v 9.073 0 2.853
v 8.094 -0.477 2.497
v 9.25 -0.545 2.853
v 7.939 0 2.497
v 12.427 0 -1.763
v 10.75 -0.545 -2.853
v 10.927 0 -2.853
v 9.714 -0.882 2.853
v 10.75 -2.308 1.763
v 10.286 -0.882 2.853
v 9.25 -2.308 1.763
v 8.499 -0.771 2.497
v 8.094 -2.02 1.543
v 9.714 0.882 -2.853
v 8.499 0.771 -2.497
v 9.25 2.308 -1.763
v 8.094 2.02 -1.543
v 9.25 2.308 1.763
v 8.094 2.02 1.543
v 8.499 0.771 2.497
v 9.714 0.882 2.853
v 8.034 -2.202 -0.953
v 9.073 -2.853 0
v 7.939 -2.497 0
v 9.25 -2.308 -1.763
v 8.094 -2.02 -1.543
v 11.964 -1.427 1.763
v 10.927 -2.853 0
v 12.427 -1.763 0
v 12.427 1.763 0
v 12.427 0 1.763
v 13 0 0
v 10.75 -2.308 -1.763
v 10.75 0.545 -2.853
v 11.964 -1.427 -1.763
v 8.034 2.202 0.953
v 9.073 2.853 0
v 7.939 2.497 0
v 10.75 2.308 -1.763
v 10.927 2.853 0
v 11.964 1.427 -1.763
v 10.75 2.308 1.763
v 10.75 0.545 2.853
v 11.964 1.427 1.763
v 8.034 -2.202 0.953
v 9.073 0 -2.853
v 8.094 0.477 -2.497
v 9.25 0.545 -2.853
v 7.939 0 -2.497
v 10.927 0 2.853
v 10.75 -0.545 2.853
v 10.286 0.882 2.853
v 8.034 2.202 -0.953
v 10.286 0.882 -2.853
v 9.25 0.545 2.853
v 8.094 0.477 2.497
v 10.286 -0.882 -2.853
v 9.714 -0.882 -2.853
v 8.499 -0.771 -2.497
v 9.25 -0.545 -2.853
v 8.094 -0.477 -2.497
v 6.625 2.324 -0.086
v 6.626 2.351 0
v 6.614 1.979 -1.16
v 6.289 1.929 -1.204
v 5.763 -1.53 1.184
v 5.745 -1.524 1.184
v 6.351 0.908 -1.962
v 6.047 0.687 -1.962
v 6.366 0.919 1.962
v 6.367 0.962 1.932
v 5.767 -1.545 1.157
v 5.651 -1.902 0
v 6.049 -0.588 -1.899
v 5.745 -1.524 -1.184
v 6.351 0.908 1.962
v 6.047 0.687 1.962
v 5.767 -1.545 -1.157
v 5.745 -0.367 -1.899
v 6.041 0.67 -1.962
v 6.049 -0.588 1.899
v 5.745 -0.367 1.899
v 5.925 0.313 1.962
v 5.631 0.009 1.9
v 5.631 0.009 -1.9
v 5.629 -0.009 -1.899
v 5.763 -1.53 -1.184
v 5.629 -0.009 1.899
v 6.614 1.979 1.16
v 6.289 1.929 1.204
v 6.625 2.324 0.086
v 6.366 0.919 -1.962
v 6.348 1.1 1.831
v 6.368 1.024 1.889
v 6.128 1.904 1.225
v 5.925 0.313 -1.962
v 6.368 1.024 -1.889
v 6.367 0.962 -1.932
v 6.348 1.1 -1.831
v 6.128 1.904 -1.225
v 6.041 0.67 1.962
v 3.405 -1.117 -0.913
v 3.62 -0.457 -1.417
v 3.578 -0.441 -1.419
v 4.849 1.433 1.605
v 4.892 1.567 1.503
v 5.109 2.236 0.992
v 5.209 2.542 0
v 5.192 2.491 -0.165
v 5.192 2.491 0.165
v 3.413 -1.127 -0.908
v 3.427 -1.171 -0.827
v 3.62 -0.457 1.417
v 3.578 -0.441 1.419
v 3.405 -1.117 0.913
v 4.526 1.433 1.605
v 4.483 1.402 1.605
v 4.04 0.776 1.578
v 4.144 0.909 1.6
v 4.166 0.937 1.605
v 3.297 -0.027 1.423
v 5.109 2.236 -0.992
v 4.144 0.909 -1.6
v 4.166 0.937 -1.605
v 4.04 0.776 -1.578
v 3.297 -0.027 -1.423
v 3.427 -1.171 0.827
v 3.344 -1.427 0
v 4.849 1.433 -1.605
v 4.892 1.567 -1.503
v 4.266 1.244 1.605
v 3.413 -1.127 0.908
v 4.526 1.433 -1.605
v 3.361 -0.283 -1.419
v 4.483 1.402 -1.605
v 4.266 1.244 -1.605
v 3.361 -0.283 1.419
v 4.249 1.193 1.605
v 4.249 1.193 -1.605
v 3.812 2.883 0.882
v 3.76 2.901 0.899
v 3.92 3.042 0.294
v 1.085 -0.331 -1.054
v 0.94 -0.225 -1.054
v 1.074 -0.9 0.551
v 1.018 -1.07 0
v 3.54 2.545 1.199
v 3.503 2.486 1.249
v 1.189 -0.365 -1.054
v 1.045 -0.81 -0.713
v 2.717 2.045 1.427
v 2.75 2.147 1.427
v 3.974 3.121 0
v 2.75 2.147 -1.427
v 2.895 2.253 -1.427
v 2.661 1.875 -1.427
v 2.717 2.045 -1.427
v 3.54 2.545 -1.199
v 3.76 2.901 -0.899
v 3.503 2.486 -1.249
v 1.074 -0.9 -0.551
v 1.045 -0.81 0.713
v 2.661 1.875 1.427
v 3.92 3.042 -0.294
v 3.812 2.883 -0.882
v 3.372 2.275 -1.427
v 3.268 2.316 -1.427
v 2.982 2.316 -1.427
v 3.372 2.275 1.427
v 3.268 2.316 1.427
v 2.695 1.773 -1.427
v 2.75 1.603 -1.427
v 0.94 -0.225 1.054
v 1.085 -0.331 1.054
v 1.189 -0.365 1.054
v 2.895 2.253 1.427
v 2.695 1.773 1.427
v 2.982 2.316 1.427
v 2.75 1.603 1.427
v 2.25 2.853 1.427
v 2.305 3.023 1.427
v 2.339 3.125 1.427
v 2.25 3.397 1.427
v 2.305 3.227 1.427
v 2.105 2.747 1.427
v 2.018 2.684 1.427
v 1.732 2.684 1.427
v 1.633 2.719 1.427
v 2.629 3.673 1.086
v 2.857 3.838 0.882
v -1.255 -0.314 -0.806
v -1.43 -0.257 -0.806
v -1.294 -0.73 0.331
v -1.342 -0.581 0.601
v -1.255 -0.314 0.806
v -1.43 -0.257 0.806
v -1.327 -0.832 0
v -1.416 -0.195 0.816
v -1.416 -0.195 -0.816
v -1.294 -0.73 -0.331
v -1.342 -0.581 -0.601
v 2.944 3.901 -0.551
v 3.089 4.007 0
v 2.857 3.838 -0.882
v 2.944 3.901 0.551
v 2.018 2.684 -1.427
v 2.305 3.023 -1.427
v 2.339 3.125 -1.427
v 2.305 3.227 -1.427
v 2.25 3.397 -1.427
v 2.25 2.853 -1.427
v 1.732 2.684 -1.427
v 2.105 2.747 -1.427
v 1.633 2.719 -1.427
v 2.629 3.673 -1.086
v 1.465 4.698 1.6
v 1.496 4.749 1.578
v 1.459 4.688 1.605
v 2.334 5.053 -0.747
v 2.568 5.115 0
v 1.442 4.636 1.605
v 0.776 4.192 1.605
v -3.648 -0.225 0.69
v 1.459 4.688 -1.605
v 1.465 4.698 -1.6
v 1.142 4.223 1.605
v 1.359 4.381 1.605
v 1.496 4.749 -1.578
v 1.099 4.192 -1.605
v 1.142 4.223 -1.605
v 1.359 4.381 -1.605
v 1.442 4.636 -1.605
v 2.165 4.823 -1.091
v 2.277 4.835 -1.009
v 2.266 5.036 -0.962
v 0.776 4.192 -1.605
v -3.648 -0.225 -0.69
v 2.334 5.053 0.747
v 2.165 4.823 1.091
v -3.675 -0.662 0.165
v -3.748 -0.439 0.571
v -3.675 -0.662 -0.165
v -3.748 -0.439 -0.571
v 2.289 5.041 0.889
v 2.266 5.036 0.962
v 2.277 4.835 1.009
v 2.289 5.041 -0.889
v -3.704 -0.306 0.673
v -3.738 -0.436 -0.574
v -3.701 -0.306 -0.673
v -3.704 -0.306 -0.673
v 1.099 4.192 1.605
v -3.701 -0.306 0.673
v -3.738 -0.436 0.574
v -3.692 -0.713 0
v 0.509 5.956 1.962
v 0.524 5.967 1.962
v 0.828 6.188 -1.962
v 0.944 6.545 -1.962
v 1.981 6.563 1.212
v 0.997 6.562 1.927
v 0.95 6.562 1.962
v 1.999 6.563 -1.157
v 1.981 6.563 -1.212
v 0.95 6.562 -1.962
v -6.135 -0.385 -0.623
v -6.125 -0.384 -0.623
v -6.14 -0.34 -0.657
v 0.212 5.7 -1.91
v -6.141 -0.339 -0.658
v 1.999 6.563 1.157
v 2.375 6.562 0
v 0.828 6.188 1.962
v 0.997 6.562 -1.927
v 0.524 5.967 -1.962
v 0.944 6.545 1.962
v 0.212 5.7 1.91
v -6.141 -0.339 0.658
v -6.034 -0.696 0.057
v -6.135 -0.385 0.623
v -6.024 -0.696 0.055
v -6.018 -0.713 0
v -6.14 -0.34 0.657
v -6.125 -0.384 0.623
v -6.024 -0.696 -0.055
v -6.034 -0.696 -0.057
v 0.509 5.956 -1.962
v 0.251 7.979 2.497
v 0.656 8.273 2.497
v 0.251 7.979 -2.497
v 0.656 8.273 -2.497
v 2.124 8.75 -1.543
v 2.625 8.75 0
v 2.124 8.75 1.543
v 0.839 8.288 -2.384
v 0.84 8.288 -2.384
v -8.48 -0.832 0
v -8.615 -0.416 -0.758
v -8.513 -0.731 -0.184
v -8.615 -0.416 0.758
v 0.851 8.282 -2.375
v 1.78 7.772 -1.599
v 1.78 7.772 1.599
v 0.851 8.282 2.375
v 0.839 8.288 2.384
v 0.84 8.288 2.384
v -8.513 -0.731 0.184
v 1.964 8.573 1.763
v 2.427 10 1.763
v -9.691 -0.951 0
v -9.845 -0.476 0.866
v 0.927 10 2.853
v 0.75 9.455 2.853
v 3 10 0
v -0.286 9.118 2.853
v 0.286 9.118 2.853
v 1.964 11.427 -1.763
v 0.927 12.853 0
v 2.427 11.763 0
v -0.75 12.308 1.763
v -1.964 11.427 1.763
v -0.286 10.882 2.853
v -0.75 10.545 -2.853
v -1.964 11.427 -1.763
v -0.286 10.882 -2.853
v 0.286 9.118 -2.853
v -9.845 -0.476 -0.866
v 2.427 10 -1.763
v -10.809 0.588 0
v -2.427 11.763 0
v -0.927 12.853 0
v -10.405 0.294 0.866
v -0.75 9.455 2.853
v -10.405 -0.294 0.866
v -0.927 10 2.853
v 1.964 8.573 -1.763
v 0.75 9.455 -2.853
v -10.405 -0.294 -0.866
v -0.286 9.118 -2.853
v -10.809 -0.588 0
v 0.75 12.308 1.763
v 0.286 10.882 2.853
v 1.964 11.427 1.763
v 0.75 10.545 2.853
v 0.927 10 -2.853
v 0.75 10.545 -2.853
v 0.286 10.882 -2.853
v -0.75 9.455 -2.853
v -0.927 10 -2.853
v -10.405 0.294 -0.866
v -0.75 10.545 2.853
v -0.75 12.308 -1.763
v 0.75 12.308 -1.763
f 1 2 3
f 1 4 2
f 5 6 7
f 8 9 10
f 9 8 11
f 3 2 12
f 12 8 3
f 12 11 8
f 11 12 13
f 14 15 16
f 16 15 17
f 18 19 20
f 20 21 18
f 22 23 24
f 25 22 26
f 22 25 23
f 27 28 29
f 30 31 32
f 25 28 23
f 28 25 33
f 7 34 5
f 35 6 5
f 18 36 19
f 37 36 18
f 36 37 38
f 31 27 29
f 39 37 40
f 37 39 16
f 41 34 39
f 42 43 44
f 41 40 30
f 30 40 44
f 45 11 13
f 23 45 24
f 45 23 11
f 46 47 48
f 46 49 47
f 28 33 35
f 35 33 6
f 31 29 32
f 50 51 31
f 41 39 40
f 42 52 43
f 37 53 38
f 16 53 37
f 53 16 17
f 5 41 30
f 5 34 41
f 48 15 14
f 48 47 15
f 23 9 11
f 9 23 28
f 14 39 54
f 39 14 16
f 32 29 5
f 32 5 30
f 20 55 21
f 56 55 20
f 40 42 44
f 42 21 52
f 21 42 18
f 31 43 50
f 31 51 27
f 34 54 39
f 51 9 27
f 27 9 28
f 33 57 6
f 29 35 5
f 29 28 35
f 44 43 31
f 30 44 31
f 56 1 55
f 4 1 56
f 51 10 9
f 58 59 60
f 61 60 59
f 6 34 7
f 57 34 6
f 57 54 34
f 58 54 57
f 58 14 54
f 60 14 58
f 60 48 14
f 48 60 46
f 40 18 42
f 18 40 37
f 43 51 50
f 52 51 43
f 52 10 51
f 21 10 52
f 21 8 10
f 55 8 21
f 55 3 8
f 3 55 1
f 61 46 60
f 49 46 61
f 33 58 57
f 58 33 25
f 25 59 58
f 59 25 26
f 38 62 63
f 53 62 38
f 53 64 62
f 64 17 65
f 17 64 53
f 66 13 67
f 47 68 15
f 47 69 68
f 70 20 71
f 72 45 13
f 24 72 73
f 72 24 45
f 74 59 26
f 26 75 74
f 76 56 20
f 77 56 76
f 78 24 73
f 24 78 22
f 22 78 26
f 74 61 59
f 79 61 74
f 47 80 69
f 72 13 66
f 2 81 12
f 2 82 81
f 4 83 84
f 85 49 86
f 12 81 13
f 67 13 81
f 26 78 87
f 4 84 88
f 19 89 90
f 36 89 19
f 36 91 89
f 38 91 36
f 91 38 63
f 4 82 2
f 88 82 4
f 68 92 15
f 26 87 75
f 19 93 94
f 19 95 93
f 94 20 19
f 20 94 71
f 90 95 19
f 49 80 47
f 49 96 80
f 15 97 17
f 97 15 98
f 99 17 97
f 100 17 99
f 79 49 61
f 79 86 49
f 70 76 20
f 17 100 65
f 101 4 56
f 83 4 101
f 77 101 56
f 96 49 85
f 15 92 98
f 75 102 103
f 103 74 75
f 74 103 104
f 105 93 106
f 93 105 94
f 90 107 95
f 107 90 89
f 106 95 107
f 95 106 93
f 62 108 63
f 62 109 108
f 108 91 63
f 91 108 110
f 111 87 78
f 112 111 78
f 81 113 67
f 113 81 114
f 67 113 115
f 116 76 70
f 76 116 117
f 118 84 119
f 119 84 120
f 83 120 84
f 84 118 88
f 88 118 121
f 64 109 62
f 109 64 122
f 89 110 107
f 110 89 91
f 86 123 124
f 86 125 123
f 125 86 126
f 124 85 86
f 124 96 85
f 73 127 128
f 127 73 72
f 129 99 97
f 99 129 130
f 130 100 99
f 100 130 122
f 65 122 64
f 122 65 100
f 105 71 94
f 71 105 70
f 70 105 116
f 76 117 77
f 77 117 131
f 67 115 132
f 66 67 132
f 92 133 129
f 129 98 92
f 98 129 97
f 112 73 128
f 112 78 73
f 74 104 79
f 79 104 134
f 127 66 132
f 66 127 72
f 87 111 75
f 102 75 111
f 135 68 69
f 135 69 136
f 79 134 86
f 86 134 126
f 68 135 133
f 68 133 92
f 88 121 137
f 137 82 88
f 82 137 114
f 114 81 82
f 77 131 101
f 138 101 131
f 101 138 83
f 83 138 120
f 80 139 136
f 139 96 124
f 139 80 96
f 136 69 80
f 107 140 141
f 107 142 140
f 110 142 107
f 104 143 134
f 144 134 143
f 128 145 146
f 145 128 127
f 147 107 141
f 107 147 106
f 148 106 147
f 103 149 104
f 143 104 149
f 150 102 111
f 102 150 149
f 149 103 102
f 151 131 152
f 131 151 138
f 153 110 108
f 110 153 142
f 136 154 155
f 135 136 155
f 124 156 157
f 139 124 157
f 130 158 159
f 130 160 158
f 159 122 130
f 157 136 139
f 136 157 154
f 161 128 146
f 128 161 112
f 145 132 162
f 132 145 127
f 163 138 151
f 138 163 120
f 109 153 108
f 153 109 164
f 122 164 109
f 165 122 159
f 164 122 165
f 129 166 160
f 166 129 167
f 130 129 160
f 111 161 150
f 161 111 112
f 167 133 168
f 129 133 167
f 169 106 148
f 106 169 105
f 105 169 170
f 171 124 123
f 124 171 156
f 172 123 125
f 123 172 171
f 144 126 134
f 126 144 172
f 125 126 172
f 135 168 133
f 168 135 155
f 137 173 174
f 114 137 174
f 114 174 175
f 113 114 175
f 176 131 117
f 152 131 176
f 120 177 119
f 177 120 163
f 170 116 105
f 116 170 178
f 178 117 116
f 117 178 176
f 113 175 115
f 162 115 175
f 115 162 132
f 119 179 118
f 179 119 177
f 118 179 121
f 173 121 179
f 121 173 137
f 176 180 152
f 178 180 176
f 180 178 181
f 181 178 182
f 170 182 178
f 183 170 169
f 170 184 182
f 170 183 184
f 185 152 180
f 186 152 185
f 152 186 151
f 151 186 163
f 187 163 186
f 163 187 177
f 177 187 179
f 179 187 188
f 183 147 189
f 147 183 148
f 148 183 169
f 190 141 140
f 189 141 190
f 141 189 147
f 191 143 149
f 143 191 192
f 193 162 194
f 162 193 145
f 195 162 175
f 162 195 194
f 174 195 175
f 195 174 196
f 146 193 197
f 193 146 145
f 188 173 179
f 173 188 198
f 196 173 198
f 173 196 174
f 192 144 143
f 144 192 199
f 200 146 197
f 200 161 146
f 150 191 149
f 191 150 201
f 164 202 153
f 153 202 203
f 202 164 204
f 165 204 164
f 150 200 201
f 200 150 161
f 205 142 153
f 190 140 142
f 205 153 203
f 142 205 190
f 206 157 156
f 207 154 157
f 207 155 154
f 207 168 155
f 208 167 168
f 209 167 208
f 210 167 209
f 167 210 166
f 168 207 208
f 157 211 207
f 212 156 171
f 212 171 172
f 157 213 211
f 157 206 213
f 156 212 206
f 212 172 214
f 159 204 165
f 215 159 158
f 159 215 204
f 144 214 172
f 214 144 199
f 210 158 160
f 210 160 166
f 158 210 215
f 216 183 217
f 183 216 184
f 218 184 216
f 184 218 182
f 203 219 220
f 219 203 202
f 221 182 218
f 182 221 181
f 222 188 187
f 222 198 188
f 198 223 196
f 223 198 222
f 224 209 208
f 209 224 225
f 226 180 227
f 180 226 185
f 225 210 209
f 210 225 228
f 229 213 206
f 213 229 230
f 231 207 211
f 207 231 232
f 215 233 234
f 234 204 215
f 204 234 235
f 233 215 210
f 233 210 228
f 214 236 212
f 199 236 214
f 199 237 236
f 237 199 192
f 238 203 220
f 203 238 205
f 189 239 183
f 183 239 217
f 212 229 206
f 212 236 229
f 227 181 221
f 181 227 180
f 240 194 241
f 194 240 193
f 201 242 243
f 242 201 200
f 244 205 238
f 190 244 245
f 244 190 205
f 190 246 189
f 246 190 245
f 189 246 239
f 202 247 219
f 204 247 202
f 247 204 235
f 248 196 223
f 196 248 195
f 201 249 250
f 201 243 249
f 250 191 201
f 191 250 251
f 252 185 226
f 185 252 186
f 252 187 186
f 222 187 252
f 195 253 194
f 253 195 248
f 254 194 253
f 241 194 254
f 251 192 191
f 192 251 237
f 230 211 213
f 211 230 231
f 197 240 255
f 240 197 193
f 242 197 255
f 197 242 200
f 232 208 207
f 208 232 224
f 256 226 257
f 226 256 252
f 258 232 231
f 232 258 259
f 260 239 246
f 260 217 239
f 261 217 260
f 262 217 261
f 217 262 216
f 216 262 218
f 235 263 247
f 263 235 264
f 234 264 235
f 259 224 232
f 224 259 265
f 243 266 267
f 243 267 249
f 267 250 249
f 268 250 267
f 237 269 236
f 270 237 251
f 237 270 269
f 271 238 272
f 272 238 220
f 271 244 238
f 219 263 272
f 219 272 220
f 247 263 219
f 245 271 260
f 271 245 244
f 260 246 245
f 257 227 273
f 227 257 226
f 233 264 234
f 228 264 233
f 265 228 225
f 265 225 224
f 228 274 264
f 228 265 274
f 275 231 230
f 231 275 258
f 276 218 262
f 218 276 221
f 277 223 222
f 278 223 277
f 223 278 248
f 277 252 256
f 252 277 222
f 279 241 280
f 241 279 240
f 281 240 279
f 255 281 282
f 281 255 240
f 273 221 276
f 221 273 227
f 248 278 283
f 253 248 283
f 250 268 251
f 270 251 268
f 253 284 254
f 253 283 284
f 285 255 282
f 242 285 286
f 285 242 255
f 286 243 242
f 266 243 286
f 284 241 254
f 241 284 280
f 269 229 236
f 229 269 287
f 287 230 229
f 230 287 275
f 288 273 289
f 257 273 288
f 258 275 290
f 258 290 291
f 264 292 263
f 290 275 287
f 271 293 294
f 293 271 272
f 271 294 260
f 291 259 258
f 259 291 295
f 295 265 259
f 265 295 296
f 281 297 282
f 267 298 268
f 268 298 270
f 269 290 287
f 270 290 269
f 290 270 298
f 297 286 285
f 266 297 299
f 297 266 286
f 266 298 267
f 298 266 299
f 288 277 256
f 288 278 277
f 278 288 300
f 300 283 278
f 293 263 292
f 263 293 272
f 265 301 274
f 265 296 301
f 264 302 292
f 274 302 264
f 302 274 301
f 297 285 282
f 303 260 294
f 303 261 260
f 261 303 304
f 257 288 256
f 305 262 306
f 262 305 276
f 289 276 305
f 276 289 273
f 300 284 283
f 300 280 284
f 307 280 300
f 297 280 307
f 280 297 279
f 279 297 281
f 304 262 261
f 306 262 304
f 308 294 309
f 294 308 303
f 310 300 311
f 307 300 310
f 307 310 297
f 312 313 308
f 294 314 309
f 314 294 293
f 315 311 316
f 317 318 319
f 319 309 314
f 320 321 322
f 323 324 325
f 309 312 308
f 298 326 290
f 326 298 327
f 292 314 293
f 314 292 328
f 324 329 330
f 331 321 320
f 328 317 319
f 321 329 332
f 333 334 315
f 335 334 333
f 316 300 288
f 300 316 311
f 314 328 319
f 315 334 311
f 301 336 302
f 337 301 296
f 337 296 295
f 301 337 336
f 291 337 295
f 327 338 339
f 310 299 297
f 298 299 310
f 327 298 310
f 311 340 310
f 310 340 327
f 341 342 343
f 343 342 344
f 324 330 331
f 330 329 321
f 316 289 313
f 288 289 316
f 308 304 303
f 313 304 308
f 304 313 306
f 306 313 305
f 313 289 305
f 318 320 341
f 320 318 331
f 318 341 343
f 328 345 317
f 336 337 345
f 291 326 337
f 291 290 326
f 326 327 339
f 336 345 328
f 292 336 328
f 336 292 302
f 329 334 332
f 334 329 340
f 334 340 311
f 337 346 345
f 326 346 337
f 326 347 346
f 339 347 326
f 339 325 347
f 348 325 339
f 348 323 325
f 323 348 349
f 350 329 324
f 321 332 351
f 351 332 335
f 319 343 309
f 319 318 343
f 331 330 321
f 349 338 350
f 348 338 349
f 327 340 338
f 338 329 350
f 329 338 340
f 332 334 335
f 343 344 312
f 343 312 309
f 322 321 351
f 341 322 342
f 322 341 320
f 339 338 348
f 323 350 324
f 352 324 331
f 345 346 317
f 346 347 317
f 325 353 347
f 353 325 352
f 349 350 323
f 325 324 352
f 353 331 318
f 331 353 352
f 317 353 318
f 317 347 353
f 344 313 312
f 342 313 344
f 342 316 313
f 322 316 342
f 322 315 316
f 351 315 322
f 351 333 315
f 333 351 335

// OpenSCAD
hullster();
 


module hullster()
{$fan=40;
for(i=[0:1/8:1]){
ii=1-i;
hull(){
translate([10*ii,0,0])scale(ii) sphere(3);
translate([0,10*i,0])scale(i) sphere(3);
translate([-10*i,0,0])scale(i) sphere(1 );
}
}
}
